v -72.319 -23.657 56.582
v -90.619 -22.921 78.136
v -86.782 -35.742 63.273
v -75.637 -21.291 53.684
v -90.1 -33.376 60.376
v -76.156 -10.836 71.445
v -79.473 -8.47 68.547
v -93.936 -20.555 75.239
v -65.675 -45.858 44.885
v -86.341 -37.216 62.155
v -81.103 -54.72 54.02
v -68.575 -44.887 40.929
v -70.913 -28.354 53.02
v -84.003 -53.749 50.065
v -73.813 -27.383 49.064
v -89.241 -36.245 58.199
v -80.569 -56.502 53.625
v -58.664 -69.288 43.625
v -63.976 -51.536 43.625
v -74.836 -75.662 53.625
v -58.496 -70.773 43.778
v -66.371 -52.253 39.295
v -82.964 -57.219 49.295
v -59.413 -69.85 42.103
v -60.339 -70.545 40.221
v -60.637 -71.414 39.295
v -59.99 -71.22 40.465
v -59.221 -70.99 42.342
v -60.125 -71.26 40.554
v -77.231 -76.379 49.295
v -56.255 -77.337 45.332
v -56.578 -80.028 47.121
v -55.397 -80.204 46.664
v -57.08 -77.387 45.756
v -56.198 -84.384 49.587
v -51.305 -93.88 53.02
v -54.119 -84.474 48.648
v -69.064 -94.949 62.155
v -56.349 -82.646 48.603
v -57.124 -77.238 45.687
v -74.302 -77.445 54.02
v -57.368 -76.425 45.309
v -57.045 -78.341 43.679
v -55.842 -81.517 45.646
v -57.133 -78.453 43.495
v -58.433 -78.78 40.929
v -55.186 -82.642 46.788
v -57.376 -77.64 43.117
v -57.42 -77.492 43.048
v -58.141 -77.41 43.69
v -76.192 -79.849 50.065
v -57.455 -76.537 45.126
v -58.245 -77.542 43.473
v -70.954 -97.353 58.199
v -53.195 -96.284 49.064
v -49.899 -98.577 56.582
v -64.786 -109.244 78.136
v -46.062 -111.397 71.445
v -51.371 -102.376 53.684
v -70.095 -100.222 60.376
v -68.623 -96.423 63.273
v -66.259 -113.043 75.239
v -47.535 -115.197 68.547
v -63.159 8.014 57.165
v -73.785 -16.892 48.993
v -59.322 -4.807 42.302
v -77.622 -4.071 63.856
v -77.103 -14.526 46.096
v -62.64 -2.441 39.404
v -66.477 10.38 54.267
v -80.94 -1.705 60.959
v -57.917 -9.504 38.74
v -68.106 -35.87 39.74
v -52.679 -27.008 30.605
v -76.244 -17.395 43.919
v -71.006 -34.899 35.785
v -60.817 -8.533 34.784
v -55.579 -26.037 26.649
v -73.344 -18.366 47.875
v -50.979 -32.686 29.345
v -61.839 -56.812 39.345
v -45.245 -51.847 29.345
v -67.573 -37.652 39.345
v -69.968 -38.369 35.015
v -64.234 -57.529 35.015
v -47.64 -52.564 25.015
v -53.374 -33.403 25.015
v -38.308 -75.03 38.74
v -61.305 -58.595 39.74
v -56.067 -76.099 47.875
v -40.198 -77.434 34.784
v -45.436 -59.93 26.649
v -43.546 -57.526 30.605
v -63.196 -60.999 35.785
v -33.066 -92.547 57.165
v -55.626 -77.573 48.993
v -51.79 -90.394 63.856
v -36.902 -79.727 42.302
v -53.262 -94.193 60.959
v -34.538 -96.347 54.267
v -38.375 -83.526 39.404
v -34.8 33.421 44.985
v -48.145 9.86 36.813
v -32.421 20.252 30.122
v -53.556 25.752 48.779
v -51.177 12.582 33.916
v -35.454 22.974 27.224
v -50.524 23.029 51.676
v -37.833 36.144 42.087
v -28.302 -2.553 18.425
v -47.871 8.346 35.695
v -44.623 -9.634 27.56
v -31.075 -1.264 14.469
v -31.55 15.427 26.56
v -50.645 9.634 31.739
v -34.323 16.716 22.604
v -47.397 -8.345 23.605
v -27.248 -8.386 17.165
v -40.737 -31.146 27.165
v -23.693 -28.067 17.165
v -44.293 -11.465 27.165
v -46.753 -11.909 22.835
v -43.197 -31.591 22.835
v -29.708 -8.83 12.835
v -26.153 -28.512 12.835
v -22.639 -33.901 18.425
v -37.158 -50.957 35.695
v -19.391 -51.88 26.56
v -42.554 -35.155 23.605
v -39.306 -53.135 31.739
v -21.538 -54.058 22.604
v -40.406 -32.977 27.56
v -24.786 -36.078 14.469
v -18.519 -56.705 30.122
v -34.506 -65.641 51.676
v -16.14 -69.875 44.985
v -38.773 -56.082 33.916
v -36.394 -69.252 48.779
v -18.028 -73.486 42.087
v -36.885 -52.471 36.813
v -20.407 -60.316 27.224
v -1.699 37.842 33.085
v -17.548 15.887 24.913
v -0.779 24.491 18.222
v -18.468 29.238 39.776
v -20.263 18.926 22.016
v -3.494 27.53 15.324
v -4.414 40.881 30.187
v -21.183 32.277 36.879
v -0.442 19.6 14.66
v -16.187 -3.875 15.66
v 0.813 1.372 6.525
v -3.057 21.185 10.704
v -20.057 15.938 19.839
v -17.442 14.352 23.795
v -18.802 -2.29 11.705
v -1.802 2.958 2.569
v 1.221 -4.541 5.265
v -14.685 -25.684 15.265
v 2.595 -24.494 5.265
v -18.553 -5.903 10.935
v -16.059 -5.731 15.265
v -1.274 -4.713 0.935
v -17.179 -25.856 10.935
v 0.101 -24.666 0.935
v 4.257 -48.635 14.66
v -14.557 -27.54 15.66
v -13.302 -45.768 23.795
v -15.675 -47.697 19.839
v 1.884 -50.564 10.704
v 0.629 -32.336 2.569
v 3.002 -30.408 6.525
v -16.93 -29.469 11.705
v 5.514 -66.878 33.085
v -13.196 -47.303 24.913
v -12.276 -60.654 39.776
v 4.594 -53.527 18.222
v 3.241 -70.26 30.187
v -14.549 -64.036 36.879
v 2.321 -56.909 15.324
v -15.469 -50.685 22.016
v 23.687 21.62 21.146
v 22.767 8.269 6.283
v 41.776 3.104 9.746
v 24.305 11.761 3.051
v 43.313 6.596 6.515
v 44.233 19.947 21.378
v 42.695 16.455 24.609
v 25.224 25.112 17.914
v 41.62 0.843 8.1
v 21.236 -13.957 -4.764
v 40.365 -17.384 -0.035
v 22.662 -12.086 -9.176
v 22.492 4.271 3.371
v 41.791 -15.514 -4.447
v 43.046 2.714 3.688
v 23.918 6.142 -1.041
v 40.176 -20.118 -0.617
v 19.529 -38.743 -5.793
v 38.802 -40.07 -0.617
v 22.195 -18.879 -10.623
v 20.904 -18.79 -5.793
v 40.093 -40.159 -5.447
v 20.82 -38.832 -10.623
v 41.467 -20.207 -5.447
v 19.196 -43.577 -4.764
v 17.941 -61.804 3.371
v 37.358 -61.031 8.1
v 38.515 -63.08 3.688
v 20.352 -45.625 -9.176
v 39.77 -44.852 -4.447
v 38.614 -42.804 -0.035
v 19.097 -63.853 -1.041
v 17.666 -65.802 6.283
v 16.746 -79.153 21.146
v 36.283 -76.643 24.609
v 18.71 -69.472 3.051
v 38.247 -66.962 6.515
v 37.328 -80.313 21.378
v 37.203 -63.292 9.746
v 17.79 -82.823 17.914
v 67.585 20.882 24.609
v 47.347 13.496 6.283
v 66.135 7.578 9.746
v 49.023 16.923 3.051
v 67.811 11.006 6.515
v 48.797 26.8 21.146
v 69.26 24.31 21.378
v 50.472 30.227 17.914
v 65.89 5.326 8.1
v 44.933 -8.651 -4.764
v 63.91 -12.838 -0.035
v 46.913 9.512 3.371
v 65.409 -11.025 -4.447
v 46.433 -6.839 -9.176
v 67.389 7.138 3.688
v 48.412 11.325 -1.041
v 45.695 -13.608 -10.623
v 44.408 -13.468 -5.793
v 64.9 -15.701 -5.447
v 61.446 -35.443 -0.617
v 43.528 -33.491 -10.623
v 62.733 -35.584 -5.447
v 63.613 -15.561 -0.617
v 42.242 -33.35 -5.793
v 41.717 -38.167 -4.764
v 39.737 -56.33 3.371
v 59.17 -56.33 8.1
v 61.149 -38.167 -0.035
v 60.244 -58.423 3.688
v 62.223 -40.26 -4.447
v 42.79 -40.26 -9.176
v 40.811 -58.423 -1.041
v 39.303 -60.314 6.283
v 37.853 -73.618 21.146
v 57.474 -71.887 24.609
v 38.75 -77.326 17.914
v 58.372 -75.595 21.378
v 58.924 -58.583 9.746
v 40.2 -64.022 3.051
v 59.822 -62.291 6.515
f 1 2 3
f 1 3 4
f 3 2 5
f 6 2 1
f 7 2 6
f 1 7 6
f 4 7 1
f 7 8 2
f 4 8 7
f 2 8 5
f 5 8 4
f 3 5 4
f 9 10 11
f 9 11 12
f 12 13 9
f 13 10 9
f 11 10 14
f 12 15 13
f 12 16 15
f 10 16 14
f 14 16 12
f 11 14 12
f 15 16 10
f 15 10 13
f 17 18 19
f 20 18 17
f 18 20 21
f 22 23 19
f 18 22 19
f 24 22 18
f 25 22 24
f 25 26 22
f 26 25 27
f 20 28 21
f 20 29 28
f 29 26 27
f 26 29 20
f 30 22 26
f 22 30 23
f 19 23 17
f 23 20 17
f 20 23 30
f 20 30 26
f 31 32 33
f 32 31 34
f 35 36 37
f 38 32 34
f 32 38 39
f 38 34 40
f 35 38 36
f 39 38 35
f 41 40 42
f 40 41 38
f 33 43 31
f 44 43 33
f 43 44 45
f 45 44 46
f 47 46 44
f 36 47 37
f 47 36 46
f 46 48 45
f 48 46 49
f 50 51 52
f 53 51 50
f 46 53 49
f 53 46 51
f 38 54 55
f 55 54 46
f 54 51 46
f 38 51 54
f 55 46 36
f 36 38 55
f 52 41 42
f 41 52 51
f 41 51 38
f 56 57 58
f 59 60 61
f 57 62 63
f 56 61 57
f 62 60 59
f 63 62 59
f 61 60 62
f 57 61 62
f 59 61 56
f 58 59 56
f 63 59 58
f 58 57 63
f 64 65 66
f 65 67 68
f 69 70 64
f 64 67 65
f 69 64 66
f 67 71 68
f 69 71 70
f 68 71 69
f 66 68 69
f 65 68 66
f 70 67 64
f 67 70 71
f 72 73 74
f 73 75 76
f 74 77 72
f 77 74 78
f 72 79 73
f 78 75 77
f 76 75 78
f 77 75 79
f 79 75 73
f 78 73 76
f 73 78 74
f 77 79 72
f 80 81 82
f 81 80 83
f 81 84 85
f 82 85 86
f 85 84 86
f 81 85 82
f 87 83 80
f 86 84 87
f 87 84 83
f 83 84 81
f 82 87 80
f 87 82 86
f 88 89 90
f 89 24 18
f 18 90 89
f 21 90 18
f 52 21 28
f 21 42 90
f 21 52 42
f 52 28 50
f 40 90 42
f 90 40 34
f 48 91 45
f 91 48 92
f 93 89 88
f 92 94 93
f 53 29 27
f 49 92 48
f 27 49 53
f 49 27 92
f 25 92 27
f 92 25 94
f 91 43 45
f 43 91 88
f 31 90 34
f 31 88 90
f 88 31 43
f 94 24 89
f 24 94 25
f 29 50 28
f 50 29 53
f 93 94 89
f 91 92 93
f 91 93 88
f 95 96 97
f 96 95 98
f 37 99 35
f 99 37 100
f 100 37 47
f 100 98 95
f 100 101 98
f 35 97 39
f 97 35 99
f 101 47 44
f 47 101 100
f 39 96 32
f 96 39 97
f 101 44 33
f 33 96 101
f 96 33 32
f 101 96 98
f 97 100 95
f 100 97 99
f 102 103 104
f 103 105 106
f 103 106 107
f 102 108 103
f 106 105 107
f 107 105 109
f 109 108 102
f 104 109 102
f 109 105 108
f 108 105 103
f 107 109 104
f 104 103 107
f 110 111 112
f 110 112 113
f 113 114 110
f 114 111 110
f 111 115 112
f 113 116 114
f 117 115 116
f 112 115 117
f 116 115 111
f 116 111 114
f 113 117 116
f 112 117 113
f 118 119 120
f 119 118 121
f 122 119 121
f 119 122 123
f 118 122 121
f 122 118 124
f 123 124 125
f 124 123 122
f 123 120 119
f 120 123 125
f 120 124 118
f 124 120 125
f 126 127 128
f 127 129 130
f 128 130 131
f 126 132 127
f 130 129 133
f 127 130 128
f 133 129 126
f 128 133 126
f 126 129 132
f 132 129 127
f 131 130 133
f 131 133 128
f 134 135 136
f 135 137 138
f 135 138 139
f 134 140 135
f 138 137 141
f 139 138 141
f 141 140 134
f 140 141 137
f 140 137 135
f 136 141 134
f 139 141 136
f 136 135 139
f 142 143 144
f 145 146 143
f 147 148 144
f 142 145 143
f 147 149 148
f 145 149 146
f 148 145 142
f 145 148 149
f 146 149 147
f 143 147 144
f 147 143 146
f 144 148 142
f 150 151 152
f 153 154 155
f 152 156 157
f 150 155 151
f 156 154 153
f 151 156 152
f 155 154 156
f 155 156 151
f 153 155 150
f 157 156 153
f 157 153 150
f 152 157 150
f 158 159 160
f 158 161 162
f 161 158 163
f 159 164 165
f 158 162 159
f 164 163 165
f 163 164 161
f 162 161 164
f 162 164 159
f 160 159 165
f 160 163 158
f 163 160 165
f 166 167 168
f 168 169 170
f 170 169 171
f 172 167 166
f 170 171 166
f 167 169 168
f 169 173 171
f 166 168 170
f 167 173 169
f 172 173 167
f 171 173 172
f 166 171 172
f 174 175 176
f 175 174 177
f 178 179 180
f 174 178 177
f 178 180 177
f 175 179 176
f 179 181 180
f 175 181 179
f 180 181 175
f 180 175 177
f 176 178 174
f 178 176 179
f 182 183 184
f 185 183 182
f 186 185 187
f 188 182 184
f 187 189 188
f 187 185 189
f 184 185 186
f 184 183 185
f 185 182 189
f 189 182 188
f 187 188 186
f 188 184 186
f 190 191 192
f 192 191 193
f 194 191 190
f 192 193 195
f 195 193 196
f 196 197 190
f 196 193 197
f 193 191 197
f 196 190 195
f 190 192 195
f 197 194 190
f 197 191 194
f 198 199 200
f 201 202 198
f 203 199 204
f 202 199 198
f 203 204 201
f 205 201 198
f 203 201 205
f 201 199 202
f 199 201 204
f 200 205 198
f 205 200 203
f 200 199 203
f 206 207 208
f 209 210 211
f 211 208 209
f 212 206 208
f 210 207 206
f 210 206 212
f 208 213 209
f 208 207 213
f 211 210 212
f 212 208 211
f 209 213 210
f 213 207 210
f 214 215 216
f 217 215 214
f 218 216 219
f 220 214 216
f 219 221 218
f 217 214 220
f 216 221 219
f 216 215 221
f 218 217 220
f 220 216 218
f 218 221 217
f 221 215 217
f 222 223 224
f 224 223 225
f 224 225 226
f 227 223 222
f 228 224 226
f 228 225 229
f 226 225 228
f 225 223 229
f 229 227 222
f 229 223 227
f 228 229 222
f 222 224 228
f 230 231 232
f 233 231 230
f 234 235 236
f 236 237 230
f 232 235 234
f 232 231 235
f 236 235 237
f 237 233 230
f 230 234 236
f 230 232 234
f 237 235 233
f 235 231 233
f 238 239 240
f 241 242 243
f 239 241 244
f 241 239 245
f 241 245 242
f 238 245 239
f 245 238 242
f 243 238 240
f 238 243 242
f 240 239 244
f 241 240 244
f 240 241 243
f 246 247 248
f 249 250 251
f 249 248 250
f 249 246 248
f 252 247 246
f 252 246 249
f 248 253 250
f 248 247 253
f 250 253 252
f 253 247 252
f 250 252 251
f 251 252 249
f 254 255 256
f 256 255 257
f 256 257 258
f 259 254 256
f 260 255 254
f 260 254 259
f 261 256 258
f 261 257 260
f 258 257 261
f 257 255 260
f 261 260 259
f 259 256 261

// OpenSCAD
// A key placement based on British patent 1,016,993
// https://geekhack.org/index.php?topic=63415.0

// explanatory text and Fig 3
main_tent = 30;
pinky_tent = main_tent - 45;
// from index finger out
column_z_rotations = [ 34.56, 34.56, 28.14, 21.84, 13.96, 11.68 ];
tent_split_rotation = -(13.96 + 21.84) / 2;
// I measured a picture of Figure 9 from British patent 1,016,993; the
// keys drawn in there were about 106 px wide. And real keys are 20mm
// wide. Maybe these were smaller.
p2mm9 = 18 / 106;
column_x_translations = [ -(166-20)*p2mm9, -20*p2mm9, 5*p2mm9, 0, 0, 87*p2mm9 ];
column_r_translations = [ 1393*p2mm9, 1441*p2mm9, 1498*p2mm9,
                          1456*p2mm9, 1306*p2mm9, 1306*p2mm9 ];
base_r_translation = 1441 * p2mm9;
r_per_key = 150 * p2mm9;

// from Figure 4b. In the copy of this picture I obtained, keys might
// be 100px wide.
p2mm4b = 14 / 100;
_column_graph_pixels  = [ [133, 1067], [221, 965], [363, 878], [346, 793], [206, 695], [206, 695] ];
base_column_translation = [363, 878];
_column_graph_offsets = [for(c = _column_graph_pixels)
          [(c.x - base_column_translation.x) * p2mm4b,
           (c.y - base_column_translation.y) * p2mm4b]];
// N.B. these are listed from LOWEST degree (i.e. constant) to HIGHEST
column_scoop_coefficients = [ [56.951, -319.638, 84.518],
                                     [56.951, -319.638, 84.518],
                                     [56.951, -319.638, 84.518],
                                     [56.951, -319.638, 84.518],
                                     [56.951, -319.638, 84.518],
                                     [56.951, -319.638, 84.518] ];

function butlast(xs) = len(xs) >= 2 ? [for(i=[1:len(xs)-1]) xs[i]] : [];
function polynomial_at(coefs, x, m=1) = (len(coefs) == 0) ? 0 :
     m * coefs[0] + polynomial_at(butlast(coefs), x, m*x);

function column_scoop(col, row) =
     polynomial_at(column_scoop_coefficients[col], row) * p2mm4b;

module _ColumnPlace(col, row) {
          translate([84,0,20])
          translate([0, -base_r_translation, 0])
          rotate(a=column_z_rotations[col], v=[0,0,1])
          translate([column_x_translations[col], column_r_translations[col], 0])
          rotate(a=tent_split_rotation, v=[0,0,1])
          children();
}


tau = 360; // openscad works in degrees not radians

// placement
alp = tau / 24;
bet = tau / 72;
tenting_angle = tau / 24;
thu_alp = tau / 24;
thu_bet = tau / 72;
// switch_hole
keyswitch_height = 14.0;
keyswitch_width = 14.0;
mount_width = keyswitch_width + 3;
mount_height = keyswitch_height + 3;
sa_profile_key_height = 12.7;
plate_thickness = 4;
web_thickness = 3.5;
// placement
cap_top_height = plate_thickness + sa_profile_key_height;
row_radius = cap_top_height + ( ((mount_height + 1/2) / 2) / sin(alp/2) );
column_radius = cap_top_height + ( ((mount_width + 2.0) / 2) / sin(bet/2) );
thu_row_radius = cap_top_height + ( ((mount_height + 1/2) / 2) / sin(thu_alp/2) );
thu_column_radius = cap_top_height + ( ((mount_width + 2.0) / 2) / sin(thu_bet/2) );
// connectors
post_size = 0.1;


module _RowPlace(col, row) {
     tents = [30, 30, 30, 30, -15, -15];
     alpha = 360 / 24;
    // alphas = [13, 15, 18, 24, 30];
     //alphas = [3,5,8,13,21,34,55];
     alphas = [24,24,24,24,24,24];
     keyswitch_height = 14.0;
     keyswitch_width = 14.0;
     mount_width = keyswitch_width + 3;
     mount_height = keyswitch_height + 3;
     sa_profile_key_height = 12.7;
     plate_thickness = 4;
     web_thickness = 3.5;
     cap_top_height = plate_thickness + sa_profile_key_height;
//     row_radius = cap_top_height + ( ((mount_height + 1/2) / 2) / sin(alpha/2) );
     row_radius = cap_top_height + ( ((mount_height + 1/2) / 2) / sin(alphas[row]/2) );
//     echo(row, column_scoop(col, row));
//     translate([0, r_per_key * row, 0]) {
          cgo = _column_graph_offsets[col];
          translate([0, 0, cgo.y])
               translate([0, 0, row_radius])
//               rotate(a=alpha*(2-row), v=[1,0,0])
               rotate(a=alphas[row]*(2-row), v=[1,0,0])
               translate([0, 0, -row_radius])
//               translate([0,0,column_scoop(col, row)])
               rotate(a=tents[col], v=[0,1,0])
               children();
//     }
}

module KeyPlace(col, row) {
     _ColumnPlace(col, row)
          _RowPlace(col, row)
          children();
}


module ThumbPlace(col, row) {
     thu_alp = tau / 24;
     thu_bet = tau / 72;
     translate([-53, -45, 60]) {
	  /* perhaps this should be tenting-angle, but look at the
          axis. that will change what the translation after it
          needs to be when you change tenting-angle. */
	  rotate(a=tau/24, v=[1,1,0]) {
	       rotate(a=tau*(1/8 - 3/32), v=[0,0,1]) {
		    translate([mount_width, 0, 0]) {
			 translate([0, 0, thu_column_radius]) {
			      rotate(a=col*thu_bet, v=[0,1,0]) {
				   translate([0, 0, -thu_column_radius]) {
					translate([0, 0, thu_row_radius]) {
					     rotate(a=row*thu_alp, v=[1,0,0]) {
						  translate([0, 0, -thu_row_radius]) {
						       children();
						  }
					     }
					}
				   }
			      }
			 }
		    }
	       }
	  }
     }
}


module WebPost() {
     translate ([0, 0, (plate_thickness - (web_thickness/2))]) {
          cube ([post_size, post_size, web_thickness], center=true);
     }
}

module Marker(x) {
     children();
}





for(c=[0:1:5]) for(r=[0:1:4]) {
    KeyPlace(c, r) cube([20, 20, 5], center=true);
}
